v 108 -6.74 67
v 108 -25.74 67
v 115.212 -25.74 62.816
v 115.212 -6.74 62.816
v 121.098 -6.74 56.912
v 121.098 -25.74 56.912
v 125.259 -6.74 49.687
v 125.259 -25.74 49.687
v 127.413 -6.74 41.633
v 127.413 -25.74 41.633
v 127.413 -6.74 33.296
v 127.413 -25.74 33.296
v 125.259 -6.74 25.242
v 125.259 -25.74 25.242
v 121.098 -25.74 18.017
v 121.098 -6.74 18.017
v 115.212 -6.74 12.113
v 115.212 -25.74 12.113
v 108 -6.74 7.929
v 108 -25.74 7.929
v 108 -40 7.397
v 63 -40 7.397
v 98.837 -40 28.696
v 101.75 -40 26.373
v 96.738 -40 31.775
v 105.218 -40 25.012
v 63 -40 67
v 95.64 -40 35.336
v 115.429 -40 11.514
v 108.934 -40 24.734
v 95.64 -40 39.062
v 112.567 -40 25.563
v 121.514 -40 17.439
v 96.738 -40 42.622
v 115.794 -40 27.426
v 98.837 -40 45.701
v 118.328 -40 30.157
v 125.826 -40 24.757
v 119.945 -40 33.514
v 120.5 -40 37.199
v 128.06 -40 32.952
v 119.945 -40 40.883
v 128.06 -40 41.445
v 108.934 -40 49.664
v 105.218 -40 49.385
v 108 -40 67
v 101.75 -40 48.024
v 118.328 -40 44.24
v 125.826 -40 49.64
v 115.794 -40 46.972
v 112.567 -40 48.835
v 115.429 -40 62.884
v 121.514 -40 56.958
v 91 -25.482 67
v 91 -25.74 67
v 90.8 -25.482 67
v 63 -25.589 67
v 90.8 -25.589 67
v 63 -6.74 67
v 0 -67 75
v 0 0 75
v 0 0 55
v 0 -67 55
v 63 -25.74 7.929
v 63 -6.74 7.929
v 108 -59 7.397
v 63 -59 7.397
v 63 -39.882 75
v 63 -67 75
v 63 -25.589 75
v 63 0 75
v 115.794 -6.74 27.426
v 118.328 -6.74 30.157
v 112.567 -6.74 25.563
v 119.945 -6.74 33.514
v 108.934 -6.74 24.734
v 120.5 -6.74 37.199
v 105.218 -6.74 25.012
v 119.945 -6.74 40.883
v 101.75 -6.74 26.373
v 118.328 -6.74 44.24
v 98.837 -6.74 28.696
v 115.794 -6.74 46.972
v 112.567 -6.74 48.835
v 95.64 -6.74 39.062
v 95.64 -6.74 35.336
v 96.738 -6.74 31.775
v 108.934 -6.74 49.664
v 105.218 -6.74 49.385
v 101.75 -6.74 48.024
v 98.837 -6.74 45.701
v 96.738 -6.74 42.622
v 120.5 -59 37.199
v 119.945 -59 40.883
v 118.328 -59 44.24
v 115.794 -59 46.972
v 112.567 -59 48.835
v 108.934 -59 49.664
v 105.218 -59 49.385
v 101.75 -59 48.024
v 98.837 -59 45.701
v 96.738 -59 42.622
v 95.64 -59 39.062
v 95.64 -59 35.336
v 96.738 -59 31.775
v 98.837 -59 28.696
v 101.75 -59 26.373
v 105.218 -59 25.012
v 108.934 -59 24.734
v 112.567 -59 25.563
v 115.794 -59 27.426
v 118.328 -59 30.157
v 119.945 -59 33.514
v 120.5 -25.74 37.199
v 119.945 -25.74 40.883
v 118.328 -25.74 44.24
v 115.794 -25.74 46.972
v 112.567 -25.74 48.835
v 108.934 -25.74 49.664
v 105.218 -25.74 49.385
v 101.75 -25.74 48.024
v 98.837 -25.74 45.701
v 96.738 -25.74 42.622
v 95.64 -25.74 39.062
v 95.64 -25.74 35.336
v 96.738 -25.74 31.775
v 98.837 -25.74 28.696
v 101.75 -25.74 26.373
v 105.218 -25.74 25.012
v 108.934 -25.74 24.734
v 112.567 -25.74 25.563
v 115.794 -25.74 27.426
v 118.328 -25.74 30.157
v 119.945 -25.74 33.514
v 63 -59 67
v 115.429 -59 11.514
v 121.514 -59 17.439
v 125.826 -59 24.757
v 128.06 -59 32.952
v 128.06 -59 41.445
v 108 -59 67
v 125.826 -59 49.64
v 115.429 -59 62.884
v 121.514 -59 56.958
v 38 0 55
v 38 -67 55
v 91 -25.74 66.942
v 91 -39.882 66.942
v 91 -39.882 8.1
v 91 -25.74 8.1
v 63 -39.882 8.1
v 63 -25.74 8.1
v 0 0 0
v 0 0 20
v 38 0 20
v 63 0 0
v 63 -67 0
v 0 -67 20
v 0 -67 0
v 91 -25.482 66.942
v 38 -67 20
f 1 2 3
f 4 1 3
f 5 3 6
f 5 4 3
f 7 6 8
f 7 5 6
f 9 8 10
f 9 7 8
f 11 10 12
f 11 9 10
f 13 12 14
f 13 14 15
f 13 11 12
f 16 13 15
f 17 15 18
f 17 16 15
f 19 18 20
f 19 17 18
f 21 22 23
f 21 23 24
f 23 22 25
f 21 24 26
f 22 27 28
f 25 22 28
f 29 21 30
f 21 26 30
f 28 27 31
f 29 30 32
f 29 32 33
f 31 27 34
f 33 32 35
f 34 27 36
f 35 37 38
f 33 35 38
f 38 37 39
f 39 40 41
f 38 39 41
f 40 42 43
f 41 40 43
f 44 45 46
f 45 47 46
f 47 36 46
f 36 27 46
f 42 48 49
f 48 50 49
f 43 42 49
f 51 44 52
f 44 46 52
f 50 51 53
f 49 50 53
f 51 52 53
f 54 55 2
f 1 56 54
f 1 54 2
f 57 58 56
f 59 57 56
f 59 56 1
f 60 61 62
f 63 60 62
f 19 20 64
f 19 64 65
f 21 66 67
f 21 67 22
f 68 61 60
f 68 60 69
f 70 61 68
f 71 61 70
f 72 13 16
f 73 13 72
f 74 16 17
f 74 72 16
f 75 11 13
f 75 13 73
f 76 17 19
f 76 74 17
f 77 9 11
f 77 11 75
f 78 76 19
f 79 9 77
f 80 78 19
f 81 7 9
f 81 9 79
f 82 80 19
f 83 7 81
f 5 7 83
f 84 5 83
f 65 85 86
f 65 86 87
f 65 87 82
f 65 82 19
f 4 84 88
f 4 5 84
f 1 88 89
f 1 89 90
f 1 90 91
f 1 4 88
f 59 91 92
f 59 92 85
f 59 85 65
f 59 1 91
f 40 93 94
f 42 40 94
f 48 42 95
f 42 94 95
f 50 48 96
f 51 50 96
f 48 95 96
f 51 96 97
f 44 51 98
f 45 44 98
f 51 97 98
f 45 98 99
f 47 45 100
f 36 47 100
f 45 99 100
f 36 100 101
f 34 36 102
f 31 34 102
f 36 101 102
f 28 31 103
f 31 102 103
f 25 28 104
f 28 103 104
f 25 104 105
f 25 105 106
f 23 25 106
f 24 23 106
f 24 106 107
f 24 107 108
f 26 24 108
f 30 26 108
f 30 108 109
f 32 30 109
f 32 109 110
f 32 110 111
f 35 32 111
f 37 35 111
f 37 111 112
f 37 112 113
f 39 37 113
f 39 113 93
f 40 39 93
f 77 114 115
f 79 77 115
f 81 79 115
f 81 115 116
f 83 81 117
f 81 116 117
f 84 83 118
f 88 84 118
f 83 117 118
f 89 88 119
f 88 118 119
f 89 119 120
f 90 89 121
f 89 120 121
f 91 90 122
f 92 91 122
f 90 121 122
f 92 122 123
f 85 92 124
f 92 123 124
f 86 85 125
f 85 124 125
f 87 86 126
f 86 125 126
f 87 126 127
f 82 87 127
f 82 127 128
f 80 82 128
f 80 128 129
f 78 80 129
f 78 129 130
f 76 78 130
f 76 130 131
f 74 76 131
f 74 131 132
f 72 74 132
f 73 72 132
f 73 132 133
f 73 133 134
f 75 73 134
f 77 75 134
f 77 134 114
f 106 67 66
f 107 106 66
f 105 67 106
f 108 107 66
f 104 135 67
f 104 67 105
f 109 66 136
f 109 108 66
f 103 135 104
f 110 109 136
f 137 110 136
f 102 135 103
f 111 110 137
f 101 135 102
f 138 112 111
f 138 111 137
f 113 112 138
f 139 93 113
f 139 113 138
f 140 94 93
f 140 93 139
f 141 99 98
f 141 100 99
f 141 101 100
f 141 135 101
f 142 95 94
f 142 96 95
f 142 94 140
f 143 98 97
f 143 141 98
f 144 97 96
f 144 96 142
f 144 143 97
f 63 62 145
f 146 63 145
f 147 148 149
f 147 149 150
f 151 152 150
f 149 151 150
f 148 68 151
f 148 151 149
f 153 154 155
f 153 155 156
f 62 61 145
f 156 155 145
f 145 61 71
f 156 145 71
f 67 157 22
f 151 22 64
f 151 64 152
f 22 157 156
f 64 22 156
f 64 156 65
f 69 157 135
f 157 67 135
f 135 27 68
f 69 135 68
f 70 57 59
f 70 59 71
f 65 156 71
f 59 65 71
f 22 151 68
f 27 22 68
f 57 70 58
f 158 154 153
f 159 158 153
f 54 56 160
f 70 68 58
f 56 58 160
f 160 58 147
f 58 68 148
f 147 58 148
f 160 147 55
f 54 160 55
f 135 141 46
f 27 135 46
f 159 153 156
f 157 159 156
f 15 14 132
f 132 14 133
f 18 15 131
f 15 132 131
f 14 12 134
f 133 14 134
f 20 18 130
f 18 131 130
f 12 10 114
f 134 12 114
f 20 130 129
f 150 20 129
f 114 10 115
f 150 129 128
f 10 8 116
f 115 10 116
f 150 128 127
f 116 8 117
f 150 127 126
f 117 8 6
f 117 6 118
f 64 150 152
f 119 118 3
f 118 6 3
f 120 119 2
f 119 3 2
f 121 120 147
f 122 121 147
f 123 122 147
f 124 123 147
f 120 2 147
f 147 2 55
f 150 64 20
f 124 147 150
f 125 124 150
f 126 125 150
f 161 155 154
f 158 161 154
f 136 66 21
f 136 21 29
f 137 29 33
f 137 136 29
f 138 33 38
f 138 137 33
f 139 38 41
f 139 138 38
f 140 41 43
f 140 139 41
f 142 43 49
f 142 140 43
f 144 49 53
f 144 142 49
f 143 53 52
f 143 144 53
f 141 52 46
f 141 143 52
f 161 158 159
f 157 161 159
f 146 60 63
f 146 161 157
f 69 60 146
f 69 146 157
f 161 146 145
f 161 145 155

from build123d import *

# Parameters (mm, degrees)
F1_DEPTH  = 67
F2_W      = 19
F2_H      = 59.602782
F3_DEPTH  = 45
F4_W      = 19
F4_H      = 59.070988
F5_DEPTH  = 45
F7_DEPTH  = 19
F9_DEPTH  = 19
F10_W     = 28
F10_H     = 14.292508
F11_DEPTH = 66.9
F13_DEPTH = 14.4
F14_R     = 12.5
F15_DEPTH = 65.5


with BuildPart() as f1:
    # F0 (on Front) → F1 (new body)
    with BuildSketch(Plane.XZ):
        Polygon((0, 20), (0, 0), (63, 0), (63, 75), (0, 75), (0, 55), (38, 55), (38, 20), align=None)
    extrude(amount=F1_DEPTH)

    # F2 (on face) → F3 (join)
    with BuildSketch(Plane.YZ.offset(63)):
        with Locations((-49.5, 37.198609)):
            Rectangle(F2_W, F2_H)
    extrude(amount=F3_DEPTH)

    # F4 (on face) → F5 (join)
    with BuildSketch(Plane.YZ.offset(63)):
        with Locations((-16.24, 37.464506)):
            Rectangle(F4_W, F4_H)
    extrude(amount=F5_DEPTH)

    # F6 (on face) → F7 (join)
    with BuildSketch(Plane.XZ.offset(59)):
        with BuildLine():
            Line((108, 67), (108, 7.397218))
            ThreePointArc((108, 7.397218), (128.343367, 37.198609), (108, 67))
        make_face()
    extrude(amount=-F7_DEPTH)

    # F8 (on face) → F9 (join)
    with BuildSketch(Plane(origin=(0, -6.74, 0), x_dir=(-1, 0, 0), z_dir=(0, 1, 0))):
        with BuildLine():
            Line((-108, 7.929012), (-108, 67))
            ThreePointArc((-108, 67), (-127.685188, 37.464506), (-108, 7.929012))
        make_face()
    extrude(amount=-F9_DEPTH)

    # F10 (on face) → F11 (join)
    with BuildSketch(Plane.XY.offset(75)):
        with Locations((77, -32.735519)):
            Rectangle(F10_W, F10_H)
    extrude(amount=-F11_DEPTH)

    # F12 (on face) → F13 (cut)
    with BuildSketch(Plane.XZ.offset(39.881773)):
        Polygon((63, 75), (91, 66.942476), (91, 75), align=None)
    extrude(amount=-F13_DEPTH, mode=Mode.SUBTRACT)

    # F14 (on face) → F15 (cut)
    with BuildSketch(Plane.XZ.offset(59)):
        with Locations((108, 37.198609)):
            Circle(F14_R)
    extrude(amount=-F15_DEPTH, mode=Mode.SUBTRACT)


solid = f1.part
